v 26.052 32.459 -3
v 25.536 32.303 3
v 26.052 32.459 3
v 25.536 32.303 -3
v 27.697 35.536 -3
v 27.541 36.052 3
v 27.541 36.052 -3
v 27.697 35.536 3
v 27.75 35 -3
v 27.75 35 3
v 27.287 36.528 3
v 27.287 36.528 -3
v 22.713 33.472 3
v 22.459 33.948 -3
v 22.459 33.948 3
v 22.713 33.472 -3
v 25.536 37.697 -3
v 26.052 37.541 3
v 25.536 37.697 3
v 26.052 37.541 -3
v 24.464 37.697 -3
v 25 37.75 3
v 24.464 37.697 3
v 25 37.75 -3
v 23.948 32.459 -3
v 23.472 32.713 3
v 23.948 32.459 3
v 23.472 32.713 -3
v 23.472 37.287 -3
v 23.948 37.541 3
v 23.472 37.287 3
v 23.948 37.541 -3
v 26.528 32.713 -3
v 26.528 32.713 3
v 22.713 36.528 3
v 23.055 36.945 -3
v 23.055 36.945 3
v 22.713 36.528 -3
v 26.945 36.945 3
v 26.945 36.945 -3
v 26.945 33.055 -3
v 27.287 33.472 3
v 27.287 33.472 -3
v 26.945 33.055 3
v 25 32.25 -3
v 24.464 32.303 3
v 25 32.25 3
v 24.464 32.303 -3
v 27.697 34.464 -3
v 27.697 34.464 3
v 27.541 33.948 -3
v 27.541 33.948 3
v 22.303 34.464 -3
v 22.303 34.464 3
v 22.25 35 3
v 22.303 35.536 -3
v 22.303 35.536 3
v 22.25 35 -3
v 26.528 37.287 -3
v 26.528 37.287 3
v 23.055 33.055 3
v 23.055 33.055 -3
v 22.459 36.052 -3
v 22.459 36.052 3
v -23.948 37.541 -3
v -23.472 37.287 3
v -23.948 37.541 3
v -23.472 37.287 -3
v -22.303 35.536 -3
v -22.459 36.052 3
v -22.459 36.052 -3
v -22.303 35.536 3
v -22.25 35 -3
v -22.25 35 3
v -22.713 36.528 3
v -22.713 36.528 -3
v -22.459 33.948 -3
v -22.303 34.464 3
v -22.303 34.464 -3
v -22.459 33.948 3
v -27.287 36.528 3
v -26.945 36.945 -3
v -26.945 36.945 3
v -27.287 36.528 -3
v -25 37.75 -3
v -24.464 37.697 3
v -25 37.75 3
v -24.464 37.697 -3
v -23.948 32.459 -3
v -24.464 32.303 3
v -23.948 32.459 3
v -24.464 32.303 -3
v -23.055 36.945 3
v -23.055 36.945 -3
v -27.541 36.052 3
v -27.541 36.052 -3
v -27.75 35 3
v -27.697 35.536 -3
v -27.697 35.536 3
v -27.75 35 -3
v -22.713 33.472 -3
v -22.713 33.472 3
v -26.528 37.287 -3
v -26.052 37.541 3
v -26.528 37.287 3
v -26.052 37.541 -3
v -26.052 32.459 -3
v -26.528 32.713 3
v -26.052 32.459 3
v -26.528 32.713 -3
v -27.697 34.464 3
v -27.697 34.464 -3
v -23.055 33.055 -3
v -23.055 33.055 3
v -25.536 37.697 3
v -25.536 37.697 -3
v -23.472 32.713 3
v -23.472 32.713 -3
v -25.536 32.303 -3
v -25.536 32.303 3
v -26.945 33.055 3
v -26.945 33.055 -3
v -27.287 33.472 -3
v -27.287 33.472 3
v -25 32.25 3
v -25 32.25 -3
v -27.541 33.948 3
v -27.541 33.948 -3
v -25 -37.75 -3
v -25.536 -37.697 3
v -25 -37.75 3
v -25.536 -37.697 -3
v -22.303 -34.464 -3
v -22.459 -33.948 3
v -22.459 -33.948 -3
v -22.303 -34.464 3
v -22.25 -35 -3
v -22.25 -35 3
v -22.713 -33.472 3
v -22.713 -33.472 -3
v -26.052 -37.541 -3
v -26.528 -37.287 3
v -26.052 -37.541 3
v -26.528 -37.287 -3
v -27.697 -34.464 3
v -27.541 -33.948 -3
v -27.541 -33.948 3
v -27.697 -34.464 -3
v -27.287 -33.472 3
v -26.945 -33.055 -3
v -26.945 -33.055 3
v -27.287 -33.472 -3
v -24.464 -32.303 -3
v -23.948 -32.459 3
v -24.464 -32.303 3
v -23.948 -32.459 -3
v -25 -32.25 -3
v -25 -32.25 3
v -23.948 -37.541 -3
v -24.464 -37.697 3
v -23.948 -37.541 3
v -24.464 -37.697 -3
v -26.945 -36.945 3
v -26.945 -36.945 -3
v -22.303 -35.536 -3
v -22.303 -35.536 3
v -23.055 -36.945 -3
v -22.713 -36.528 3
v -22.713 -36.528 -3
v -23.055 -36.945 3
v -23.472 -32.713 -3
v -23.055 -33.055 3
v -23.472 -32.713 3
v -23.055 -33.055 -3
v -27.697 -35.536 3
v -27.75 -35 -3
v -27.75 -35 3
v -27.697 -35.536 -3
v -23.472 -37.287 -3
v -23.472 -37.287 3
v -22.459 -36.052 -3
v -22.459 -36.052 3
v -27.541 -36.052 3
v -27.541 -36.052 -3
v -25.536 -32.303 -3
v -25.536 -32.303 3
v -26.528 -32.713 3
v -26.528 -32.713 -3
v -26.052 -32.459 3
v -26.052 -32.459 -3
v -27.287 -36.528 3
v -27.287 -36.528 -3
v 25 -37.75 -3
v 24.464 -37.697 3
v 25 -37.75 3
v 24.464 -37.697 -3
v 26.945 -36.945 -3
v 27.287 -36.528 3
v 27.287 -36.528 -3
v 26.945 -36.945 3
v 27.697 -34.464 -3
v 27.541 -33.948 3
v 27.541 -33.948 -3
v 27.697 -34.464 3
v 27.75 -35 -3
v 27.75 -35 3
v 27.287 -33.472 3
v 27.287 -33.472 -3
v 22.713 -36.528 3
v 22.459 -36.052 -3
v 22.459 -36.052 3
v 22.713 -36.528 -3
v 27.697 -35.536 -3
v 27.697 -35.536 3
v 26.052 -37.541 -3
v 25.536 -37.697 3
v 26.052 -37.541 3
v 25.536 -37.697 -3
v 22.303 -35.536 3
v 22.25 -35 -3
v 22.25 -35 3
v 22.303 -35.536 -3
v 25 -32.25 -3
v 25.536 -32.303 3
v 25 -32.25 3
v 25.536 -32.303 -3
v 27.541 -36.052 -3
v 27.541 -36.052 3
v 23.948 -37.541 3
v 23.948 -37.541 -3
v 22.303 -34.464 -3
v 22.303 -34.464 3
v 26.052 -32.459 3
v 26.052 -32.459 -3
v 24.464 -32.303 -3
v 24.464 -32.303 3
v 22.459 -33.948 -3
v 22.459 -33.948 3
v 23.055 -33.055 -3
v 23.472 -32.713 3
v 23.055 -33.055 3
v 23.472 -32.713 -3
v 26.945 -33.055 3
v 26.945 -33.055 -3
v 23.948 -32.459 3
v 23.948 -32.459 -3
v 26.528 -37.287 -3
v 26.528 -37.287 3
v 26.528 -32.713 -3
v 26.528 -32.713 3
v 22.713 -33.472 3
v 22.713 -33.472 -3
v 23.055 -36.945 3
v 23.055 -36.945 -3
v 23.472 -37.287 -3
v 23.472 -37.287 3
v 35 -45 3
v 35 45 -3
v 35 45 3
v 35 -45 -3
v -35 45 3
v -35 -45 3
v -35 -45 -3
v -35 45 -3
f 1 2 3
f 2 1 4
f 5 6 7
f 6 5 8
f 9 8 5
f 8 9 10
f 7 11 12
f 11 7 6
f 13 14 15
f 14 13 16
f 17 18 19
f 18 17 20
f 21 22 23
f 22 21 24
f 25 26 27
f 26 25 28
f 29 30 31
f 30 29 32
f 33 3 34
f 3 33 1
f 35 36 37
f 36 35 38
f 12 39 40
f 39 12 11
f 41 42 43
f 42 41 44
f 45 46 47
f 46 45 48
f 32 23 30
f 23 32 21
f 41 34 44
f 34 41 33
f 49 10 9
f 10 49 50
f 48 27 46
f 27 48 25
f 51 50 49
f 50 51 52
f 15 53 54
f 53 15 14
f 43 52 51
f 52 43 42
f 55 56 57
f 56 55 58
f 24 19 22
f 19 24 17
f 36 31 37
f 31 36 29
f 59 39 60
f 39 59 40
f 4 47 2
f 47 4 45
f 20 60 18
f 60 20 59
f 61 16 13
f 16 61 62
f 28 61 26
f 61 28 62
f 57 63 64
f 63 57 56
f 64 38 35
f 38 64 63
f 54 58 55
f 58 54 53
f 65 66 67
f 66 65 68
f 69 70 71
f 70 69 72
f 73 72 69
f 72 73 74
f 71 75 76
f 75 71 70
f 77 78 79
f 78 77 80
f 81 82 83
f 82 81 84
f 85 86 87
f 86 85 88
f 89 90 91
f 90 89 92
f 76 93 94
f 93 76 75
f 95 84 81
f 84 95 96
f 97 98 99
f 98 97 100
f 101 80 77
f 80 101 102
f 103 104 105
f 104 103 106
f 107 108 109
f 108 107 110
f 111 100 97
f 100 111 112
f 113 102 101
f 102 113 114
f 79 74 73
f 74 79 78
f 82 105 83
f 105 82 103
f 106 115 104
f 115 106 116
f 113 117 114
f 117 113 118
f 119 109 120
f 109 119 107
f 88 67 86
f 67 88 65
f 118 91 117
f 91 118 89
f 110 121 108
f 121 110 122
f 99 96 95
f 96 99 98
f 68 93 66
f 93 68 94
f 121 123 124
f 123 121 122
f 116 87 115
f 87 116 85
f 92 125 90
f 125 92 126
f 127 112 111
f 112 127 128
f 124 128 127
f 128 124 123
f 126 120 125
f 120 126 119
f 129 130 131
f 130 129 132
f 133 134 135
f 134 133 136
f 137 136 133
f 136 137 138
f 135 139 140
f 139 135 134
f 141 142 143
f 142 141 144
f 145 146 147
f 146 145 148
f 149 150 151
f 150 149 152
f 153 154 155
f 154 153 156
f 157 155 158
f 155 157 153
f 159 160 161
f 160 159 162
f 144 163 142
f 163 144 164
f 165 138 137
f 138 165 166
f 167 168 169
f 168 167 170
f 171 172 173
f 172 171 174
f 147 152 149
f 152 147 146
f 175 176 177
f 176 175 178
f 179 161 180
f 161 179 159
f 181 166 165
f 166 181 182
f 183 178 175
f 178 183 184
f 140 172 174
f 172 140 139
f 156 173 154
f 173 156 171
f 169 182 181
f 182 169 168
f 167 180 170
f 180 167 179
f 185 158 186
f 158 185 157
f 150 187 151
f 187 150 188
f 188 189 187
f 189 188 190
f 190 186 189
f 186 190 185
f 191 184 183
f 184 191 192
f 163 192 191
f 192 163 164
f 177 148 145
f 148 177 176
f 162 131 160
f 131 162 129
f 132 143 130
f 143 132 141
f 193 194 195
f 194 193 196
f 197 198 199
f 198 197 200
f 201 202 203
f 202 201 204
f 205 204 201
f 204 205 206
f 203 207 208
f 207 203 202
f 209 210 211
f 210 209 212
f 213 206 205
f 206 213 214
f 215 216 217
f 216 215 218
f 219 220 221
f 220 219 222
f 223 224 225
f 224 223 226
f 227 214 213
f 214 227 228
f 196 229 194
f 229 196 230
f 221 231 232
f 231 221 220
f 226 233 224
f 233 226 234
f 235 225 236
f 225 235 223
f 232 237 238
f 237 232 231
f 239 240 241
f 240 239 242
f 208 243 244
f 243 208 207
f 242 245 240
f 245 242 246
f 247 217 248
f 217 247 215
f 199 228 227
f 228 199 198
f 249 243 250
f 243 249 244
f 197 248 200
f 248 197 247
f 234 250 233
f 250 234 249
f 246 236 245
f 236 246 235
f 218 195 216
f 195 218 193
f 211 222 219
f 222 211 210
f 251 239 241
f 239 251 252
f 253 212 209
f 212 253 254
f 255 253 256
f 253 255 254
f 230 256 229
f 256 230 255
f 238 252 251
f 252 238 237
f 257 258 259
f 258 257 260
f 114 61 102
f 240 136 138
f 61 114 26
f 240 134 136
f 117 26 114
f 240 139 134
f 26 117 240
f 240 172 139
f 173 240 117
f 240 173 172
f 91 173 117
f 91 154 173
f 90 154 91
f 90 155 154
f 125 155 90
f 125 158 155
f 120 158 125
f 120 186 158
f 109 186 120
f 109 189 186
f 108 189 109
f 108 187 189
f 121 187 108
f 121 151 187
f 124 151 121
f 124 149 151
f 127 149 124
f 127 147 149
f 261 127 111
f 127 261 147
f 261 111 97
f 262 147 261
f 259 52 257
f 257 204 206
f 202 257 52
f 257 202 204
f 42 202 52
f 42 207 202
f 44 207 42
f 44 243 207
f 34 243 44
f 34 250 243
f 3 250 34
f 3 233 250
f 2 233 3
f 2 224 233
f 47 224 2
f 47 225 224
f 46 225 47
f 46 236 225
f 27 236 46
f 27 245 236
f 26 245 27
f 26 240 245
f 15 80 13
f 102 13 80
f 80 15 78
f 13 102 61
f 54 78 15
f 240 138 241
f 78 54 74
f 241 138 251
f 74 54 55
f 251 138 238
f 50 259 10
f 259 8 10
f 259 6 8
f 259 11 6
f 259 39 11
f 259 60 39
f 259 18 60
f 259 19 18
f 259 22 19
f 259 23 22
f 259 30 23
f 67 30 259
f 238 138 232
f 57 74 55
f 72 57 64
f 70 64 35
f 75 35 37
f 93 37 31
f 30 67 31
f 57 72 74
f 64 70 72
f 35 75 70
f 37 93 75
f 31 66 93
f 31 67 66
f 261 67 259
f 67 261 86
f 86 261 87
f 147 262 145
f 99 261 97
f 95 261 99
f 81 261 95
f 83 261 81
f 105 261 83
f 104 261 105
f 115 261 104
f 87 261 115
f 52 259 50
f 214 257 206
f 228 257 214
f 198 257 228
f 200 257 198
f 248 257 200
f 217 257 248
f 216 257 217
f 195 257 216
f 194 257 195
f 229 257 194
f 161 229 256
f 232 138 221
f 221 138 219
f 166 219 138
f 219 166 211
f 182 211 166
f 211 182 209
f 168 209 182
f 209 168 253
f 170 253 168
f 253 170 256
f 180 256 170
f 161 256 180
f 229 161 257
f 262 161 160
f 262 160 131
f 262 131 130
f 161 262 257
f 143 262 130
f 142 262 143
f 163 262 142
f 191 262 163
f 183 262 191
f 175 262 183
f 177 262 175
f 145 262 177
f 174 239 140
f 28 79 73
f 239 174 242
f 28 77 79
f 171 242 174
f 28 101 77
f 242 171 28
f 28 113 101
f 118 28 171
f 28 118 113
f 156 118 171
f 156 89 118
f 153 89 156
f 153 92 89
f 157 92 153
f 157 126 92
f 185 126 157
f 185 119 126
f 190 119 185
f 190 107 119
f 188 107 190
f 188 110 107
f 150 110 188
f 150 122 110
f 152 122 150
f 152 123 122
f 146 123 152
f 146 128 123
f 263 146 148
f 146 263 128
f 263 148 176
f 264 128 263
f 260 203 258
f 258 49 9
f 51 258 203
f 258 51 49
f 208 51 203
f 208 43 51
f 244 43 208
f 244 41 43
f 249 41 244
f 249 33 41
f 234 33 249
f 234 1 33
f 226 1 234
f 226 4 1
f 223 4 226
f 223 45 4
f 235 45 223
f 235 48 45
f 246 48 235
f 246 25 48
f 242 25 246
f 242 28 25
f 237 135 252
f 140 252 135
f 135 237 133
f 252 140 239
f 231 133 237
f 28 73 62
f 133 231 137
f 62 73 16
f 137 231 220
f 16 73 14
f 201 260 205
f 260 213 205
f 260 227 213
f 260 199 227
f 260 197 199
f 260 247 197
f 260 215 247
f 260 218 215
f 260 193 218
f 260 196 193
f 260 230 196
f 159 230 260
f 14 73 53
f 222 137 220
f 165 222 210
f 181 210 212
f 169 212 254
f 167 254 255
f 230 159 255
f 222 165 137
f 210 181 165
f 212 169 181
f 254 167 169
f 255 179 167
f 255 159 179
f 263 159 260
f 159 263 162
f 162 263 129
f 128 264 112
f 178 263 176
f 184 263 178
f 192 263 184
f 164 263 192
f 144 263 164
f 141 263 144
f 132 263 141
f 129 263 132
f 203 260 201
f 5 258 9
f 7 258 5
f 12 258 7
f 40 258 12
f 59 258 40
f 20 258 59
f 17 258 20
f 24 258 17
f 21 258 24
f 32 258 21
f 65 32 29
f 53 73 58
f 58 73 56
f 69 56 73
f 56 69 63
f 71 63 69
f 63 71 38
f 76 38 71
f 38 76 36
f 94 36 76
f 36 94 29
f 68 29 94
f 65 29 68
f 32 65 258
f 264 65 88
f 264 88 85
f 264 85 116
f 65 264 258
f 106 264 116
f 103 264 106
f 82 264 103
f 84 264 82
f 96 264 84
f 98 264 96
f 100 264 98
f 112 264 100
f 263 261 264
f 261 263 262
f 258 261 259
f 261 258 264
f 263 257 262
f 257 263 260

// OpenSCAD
$fn = 32;

// ----------------------------------------------------------------------
// Corner plate 70 x 90 x 6
// 4 holes, centres taken from the edge offset
// ----------------------------------------------------------------------

// --- parameters (mm) ---
plate = [70, 90, 6];  // overall size (x, y, z)
holes = 4;            // number of holes the drawing asks for
hole_d = 5.5;         // hole diameter
edge = 10;            // hole centre offset from the plate edge

// --- derived feature positions (mm) ---
corner_x = plate[0] / 2 - edge;  // = 25   corner hole X
corner_y = plate[1] / 2 - edge;  // = 35   corner hole Y
feature_centers = [
  [corner_x, corner_y],
  [-corner_x, corner_y],
  [-corner_x, -corner_y],
  [corner_x, -corner_y]
];   // hole centres the loop below drills

// plate outline, every hole drilled through with the same cutters
difference() {
  cube(plate, center = true);
  for (centre = feature_centers)
    translate([centre[0], centre[1], 0])
      cylinder(d = hole_d, h = plate[2] + 2, center = true);
}
